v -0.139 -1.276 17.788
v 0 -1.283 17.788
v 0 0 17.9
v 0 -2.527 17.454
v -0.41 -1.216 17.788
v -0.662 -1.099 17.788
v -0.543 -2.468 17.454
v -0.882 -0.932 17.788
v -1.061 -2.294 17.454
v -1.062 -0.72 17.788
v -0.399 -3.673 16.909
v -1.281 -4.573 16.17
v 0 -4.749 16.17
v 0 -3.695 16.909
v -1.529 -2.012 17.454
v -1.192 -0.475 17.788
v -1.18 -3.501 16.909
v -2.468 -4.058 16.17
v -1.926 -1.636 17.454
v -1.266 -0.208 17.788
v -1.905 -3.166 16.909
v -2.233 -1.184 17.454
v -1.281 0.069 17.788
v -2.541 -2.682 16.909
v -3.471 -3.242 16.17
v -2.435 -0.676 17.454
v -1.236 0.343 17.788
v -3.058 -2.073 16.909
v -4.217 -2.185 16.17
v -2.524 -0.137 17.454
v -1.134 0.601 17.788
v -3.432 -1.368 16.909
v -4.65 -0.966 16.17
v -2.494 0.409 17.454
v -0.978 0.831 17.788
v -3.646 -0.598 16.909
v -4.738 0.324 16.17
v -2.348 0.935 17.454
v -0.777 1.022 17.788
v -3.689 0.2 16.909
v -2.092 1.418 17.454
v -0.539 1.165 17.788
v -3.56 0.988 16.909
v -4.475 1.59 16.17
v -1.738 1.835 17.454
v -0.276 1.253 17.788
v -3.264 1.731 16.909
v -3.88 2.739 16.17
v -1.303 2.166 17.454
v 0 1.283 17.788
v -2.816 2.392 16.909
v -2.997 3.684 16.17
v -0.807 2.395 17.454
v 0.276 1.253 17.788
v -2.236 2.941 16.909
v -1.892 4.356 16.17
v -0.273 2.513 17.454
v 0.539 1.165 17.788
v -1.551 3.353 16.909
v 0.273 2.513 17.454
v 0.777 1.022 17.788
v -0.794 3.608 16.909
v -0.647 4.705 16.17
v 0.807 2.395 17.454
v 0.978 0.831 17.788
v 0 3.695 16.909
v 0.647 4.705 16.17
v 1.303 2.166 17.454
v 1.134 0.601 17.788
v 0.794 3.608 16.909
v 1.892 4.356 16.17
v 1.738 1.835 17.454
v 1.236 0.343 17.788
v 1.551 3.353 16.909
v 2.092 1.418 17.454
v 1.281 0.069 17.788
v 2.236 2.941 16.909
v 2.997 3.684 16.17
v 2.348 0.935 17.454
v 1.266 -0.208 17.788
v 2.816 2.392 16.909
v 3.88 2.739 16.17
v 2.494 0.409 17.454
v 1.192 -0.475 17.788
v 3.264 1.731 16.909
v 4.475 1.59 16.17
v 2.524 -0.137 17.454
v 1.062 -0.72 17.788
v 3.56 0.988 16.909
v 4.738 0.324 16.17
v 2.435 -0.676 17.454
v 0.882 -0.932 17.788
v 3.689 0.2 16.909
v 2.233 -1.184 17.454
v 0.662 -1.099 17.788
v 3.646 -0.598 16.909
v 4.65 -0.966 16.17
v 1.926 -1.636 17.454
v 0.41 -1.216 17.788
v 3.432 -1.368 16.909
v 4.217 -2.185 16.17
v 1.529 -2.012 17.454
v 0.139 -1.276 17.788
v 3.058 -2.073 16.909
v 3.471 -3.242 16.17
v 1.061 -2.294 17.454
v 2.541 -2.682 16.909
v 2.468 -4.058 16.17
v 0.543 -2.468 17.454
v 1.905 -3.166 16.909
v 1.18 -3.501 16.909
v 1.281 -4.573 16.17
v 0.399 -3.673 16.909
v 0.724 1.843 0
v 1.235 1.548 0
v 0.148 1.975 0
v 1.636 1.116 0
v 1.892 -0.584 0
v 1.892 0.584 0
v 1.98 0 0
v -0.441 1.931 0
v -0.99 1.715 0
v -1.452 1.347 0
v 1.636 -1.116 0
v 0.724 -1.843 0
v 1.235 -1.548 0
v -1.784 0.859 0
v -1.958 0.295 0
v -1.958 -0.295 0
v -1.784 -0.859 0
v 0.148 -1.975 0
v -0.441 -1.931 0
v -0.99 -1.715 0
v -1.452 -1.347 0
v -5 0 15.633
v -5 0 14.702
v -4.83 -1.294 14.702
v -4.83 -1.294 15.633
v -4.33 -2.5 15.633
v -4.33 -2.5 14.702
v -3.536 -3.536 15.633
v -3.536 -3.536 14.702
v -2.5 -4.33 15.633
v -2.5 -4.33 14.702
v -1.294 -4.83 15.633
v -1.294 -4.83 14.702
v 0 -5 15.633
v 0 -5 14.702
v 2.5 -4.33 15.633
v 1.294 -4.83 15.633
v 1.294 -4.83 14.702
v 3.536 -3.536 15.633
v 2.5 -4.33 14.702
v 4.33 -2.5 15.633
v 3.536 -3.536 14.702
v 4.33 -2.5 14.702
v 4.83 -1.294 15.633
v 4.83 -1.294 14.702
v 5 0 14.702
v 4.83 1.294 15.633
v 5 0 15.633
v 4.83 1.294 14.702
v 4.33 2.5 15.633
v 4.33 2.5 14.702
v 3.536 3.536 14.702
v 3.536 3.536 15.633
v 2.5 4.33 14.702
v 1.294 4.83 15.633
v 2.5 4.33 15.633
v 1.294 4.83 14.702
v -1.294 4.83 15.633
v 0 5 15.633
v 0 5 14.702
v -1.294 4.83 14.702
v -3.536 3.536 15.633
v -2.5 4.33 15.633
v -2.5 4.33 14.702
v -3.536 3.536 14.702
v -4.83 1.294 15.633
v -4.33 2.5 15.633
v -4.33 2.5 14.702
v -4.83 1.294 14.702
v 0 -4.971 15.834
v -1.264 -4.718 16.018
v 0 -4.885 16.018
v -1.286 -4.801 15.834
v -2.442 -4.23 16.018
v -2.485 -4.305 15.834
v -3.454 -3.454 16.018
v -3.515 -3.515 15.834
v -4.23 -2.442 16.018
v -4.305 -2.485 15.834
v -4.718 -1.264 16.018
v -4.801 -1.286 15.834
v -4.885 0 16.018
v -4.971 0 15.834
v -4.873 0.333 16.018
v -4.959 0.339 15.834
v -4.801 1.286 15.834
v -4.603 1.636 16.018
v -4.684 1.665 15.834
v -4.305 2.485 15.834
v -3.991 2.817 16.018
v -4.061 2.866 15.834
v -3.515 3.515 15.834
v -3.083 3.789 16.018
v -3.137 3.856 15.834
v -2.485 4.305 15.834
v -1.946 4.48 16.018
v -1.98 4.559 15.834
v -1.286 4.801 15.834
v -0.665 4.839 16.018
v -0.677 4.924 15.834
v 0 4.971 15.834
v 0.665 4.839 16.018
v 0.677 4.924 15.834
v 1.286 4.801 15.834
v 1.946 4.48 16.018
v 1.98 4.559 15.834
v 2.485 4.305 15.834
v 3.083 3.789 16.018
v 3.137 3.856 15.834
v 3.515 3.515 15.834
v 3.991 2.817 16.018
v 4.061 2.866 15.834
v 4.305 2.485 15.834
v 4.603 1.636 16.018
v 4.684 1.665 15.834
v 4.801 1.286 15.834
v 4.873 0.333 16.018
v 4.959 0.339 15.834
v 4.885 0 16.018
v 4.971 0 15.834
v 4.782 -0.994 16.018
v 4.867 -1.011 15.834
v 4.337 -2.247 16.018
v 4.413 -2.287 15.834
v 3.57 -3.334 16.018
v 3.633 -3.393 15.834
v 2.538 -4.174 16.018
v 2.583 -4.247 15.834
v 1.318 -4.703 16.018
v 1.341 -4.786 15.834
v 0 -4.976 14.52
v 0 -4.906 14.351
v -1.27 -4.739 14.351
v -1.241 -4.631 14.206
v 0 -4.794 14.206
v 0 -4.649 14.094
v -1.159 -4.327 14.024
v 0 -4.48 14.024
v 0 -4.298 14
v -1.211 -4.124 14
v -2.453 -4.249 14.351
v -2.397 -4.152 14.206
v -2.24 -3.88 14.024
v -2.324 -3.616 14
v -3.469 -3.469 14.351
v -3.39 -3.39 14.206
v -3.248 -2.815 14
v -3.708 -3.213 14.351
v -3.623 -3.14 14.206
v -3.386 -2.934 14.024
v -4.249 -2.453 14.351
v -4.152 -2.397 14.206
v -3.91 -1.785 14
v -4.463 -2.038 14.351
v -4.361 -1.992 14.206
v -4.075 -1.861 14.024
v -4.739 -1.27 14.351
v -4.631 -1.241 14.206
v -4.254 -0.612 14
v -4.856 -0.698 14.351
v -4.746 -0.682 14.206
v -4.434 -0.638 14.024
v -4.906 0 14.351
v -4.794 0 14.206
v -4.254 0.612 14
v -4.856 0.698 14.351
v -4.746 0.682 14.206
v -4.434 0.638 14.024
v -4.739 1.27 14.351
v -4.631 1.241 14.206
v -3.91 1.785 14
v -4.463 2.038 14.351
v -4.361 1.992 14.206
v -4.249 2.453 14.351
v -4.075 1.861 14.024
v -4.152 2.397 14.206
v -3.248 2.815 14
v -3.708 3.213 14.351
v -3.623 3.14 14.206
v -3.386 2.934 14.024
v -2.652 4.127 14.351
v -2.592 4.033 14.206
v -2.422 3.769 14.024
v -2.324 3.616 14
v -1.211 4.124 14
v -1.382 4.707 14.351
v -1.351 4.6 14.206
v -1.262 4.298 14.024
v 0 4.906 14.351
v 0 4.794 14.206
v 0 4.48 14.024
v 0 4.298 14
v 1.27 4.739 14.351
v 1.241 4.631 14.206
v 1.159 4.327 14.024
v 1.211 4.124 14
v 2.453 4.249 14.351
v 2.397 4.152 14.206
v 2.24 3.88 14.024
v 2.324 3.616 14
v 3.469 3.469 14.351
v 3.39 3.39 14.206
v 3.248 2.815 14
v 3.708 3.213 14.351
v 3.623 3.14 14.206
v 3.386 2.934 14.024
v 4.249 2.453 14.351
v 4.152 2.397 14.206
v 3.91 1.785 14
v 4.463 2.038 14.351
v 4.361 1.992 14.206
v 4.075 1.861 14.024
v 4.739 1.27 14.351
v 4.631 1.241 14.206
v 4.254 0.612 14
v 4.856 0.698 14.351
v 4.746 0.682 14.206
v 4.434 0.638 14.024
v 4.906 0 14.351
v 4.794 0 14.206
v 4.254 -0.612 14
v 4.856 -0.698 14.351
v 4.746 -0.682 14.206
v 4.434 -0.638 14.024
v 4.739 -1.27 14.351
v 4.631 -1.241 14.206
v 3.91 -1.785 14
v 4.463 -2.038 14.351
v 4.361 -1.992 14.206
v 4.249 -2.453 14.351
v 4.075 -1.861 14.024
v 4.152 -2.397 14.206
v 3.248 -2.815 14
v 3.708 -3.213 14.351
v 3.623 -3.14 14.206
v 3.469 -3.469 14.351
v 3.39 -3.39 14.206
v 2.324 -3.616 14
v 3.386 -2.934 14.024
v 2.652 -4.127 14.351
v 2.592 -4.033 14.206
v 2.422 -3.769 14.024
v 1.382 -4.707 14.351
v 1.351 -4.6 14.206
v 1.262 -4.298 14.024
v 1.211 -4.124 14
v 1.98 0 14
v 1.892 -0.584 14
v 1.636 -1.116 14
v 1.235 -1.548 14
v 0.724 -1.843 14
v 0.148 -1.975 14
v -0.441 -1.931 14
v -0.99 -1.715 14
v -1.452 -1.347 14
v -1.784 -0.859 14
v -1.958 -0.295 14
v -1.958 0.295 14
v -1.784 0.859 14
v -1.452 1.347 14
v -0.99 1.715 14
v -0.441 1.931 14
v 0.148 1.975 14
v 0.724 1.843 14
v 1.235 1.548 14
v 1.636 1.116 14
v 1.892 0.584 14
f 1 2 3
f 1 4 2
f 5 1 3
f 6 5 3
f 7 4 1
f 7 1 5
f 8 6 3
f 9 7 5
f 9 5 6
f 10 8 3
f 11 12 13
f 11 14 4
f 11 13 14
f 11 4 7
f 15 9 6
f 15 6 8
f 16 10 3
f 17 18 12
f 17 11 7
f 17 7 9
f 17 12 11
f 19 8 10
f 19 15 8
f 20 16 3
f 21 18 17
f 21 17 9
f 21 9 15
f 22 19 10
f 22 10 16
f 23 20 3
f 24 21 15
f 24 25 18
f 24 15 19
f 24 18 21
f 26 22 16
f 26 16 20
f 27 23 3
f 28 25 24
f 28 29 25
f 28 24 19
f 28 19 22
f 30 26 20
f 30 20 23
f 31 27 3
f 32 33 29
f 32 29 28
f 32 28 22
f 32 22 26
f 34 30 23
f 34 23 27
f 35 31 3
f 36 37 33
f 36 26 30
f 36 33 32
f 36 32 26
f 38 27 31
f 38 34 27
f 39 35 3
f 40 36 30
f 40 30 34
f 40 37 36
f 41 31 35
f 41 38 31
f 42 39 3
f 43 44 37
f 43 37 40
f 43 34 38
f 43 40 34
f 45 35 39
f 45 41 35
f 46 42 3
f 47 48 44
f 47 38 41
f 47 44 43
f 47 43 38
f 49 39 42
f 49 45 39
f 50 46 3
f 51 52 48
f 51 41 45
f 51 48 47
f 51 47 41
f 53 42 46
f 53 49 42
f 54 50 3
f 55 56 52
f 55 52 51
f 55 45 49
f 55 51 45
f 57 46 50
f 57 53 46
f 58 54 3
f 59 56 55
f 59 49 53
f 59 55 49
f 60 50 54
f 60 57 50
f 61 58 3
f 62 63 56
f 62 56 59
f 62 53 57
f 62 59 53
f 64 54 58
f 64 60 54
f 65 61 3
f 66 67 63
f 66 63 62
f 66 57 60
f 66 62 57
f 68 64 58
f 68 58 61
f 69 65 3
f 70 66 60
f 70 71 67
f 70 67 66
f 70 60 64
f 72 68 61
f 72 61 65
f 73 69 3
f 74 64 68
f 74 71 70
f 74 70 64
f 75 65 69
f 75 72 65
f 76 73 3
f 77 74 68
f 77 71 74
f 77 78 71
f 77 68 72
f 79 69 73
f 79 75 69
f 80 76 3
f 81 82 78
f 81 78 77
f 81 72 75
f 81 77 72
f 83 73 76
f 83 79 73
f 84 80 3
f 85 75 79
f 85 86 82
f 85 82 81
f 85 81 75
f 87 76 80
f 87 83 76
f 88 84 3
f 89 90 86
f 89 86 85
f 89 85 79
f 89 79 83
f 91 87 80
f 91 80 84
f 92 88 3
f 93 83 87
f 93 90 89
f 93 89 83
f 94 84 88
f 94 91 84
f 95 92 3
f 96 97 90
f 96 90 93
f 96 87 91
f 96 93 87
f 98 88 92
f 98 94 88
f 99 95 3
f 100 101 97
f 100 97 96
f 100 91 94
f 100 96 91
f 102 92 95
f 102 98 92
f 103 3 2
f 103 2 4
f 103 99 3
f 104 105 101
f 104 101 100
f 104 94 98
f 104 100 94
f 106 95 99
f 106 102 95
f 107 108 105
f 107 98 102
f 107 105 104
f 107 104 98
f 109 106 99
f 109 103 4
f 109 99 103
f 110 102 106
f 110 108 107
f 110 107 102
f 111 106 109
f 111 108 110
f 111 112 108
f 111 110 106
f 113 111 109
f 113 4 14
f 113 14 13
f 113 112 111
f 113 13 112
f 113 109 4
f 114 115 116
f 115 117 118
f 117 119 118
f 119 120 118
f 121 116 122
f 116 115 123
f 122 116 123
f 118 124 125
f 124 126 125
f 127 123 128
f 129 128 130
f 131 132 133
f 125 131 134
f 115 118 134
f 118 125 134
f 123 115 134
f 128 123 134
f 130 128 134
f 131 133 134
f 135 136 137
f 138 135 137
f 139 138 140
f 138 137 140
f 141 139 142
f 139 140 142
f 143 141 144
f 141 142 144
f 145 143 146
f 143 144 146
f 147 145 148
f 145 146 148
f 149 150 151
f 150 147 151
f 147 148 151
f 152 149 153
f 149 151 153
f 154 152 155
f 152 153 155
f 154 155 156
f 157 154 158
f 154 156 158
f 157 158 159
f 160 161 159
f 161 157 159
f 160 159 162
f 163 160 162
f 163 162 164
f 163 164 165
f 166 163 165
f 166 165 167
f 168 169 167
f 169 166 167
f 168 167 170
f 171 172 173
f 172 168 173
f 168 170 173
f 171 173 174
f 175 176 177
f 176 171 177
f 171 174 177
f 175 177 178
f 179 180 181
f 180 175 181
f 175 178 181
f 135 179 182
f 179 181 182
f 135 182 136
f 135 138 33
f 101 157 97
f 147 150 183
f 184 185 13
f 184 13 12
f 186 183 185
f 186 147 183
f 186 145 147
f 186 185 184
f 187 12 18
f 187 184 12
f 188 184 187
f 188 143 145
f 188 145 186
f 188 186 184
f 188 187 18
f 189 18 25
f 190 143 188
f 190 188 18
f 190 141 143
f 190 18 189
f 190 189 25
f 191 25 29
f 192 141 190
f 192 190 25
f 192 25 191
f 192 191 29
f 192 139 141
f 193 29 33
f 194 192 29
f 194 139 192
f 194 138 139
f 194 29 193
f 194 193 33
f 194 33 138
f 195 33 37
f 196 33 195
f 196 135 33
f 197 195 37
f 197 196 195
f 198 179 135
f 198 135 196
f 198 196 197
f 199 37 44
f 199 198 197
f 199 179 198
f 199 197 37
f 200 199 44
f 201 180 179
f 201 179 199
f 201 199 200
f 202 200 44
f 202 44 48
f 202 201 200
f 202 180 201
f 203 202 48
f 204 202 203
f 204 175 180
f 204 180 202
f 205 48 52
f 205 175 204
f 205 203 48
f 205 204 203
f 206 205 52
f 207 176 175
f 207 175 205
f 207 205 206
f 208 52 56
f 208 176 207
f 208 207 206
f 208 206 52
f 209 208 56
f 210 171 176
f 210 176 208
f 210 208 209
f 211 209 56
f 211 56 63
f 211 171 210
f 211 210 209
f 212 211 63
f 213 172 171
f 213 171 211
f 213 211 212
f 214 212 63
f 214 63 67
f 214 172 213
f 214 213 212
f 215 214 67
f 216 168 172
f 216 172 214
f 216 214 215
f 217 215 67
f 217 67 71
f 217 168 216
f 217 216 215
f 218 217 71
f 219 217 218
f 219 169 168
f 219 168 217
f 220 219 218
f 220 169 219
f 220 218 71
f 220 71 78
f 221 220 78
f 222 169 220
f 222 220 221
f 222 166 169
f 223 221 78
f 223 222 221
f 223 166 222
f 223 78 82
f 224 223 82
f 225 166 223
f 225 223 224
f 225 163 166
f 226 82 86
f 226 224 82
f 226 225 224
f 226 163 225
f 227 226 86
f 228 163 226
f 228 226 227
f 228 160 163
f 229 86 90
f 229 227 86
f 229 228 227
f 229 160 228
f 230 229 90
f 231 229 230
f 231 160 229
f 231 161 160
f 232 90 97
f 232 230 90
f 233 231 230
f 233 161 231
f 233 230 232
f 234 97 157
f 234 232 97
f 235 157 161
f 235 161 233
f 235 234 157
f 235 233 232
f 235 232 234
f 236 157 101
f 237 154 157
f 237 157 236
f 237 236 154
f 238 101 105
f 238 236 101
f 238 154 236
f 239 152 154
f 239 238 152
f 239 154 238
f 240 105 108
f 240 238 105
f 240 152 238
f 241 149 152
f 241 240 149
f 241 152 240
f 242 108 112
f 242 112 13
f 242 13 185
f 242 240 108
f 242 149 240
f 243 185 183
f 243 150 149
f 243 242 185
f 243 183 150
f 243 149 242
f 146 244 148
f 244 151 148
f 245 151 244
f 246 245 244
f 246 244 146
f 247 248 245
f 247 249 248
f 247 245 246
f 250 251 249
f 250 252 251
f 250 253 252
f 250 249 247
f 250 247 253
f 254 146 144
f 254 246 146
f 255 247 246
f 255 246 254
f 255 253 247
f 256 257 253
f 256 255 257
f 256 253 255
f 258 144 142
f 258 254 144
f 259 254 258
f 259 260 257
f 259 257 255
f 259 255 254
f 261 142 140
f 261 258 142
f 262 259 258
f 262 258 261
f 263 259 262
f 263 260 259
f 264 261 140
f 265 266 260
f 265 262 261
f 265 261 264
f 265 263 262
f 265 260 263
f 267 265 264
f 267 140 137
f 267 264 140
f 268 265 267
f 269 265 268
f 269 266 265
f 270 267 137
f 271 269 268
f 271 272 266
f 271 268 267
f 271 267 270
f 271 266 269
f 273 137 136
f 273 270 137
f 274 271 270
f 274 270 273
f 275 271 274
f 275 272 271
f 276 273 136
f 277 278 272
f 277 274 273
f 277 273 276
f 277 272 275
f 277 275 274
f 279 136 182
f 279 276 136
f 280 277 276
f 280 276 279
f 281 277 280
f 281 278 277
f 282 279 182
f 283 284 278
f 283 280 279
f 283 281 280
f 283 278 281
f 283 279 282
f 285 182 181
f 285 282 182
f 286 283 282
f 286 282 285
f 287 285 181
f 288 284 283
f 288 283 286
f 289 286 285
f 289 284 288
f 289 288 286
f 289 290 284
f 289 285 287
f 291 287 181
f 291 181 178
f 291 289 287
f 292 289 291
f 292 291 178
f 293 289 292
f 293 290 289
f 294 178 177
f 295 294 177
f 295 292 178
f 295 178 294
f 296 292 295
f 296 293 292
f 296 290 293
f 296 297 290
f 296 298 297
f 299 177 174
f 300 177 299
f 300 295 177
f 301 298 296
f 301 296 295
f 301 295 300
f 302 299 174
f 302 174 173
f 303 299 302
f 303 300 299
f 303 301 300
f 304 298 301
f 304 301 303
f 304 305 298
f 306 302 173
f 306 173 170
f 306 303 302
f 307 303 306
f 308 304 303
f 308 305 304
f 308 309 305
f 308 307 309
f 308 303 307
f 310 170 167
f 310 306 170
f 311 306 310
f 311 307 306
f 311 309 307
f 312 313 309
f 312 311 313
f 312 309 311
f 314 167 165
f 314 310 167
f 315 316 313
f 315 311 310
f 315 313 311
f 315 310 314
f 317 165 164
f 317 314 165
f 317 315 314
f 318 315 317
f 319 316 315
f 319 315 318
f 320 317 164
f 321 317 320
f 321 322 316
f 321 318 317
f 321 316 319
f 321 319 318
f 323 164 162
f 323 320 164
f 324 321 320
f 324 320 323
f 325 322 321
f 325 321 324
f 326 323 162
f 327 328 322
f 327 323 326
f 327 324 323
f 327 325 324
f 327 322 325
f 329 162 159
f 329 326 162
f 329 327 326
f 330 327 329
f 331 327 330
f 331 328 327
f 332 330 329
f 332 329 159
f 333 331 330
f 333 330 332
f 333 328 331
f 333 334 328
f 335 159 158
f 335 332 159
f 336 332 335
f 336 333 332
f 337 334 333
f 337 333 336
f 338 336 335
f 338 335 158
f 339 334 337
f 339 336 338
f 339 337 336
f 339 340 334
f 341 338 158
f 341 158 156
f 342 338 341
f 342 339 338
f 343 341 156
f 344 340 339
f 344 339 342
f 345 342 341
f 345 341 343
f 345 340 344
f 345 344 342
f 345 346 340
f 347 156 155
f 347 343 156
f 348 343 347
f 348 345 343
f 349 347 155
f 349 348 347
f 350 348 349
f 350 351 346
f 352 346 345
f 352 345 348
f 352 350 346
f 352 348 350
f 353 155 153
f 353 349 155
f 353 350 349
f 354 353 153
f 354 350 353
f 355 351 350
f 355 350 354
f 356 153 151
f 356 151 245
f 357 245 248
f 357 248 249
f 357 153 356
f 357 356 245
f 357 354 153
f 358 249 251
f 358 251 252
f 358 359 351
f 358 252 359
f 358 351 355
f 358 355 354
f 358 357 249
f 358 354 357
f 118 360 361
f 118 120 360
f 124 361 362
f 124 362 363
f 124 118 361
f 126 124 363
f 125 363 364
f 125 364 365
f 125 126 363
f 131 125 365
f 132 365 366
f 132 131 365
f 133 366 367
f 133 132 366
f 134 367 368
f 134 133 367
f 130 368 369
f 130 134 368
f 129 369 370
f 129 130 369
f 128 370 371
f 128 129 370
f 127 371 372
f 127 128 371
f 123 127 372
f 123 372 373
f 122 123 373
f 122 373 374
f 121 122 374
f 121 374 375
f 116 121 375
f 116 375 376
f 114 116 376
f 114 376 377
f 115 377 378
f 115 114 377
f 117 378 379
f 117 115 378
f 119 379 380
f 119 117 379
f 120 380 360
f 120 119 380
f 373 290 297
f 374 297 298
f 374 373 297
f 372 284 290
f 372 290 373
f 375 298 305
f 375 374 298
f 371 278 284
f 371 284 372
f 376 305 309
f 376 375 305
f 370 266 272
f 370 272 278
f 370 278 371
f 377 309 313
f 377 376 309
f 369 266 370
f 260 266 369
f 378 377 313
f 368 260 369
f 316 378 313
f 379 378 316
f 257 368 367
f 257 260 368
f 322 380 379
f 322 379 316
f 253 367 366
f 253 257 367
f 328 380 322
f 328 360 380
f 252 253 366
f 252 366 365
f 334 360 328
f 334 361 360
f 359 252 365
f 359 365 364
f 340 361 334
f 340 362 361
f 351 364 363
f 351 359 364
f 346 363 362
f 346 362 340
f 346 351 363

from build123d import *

# Parameters (mm, degrees)
SKETCH3_W = 14
SKETCH3_H = 1.980384758
SKETCH8_W = 3.9
SKETCH8_H = 5


with BuildPart() as part:
    # Sketch3 → Revolve1 (revolve)
    with BuildSketch(Plane(origin=(0, 0, 0), x_dir=(0, 0, -1), z_dir=(1, 0, 0)), mode=Mode.PRIVATE) as revolve1_sk:
        with Locations((-7, 0.990192379)):
            Rectangle(SKETCH3_W, SKETCH3_H)
    revolve(revolve1_sk.sketch.rotate(Axis((0, 0, 0), (0, 0, -1)), 90), axis=Axis((0, 0, 0), (0, 0, -1)))

    # Sketch8 → Revolve2 (revolve)
    with BuildSketch(Plane(origin=(0, 0, 0), x_dir=(0, 0, -1), z_dir=(1, 0, 0)), mode=Mode.PRIVATE) as revolve2_sk:
        with Locations((-15.95, 2.5)):
            Rectangle(SKETCH8_W, SKETCH8_H)
    revolve(revolve2_sk.sketch.rotate(Axis((0, 0, 0), (0, 0, 1)), 90), axis=Axis((0, 0, 0), (0, 0, 1)))

    # Sketch11 → Cut-Revolve3 (revolve, cut)
    with BuildSketch(Plane(origin=(0, 0, 0), x_dir=(0, 0, -1), z_dir=(1, 0, 0)), mode=Mode.PRIVATE) as cut_revolve3_sk:
        with BuildLine():
            Line((-15.632664285, 5), (-14.702, 5))
            ThreePointArc((-14.702, 5), (-14.20561104, 4.79438896), (-14, 4.298))
            Line((-14, 4.298), (-13.365, 4.298))
            Line((-13.365, 4.298), (-13.365, 5.635))
            Line((-13.365, 5.635), (-18.535, 5.635))
            Line((-18.535, 5.635), (-18.535, 0))
            Line((-18.535, 0), (-17.9, 0))
            ThreePointArc((-17.9, 0), (-17.454099823, 2.527320184), (-16.170243589, 4.749455969))
            ThreePointArc((-16.170243589, 4.749455969), (-15.929212687, 4.934288492), (-15.632664285, 5))
        make_face()
    revolve(cut_revolve3_sk.sketch.rotate(Axis((0, 0, 17.9), (0, 0, -1)), 180), axis=Axis((0, 0, 17.9), (0, 0, -1)), mode=Mode.SUBTRACT)


solid = part.part
